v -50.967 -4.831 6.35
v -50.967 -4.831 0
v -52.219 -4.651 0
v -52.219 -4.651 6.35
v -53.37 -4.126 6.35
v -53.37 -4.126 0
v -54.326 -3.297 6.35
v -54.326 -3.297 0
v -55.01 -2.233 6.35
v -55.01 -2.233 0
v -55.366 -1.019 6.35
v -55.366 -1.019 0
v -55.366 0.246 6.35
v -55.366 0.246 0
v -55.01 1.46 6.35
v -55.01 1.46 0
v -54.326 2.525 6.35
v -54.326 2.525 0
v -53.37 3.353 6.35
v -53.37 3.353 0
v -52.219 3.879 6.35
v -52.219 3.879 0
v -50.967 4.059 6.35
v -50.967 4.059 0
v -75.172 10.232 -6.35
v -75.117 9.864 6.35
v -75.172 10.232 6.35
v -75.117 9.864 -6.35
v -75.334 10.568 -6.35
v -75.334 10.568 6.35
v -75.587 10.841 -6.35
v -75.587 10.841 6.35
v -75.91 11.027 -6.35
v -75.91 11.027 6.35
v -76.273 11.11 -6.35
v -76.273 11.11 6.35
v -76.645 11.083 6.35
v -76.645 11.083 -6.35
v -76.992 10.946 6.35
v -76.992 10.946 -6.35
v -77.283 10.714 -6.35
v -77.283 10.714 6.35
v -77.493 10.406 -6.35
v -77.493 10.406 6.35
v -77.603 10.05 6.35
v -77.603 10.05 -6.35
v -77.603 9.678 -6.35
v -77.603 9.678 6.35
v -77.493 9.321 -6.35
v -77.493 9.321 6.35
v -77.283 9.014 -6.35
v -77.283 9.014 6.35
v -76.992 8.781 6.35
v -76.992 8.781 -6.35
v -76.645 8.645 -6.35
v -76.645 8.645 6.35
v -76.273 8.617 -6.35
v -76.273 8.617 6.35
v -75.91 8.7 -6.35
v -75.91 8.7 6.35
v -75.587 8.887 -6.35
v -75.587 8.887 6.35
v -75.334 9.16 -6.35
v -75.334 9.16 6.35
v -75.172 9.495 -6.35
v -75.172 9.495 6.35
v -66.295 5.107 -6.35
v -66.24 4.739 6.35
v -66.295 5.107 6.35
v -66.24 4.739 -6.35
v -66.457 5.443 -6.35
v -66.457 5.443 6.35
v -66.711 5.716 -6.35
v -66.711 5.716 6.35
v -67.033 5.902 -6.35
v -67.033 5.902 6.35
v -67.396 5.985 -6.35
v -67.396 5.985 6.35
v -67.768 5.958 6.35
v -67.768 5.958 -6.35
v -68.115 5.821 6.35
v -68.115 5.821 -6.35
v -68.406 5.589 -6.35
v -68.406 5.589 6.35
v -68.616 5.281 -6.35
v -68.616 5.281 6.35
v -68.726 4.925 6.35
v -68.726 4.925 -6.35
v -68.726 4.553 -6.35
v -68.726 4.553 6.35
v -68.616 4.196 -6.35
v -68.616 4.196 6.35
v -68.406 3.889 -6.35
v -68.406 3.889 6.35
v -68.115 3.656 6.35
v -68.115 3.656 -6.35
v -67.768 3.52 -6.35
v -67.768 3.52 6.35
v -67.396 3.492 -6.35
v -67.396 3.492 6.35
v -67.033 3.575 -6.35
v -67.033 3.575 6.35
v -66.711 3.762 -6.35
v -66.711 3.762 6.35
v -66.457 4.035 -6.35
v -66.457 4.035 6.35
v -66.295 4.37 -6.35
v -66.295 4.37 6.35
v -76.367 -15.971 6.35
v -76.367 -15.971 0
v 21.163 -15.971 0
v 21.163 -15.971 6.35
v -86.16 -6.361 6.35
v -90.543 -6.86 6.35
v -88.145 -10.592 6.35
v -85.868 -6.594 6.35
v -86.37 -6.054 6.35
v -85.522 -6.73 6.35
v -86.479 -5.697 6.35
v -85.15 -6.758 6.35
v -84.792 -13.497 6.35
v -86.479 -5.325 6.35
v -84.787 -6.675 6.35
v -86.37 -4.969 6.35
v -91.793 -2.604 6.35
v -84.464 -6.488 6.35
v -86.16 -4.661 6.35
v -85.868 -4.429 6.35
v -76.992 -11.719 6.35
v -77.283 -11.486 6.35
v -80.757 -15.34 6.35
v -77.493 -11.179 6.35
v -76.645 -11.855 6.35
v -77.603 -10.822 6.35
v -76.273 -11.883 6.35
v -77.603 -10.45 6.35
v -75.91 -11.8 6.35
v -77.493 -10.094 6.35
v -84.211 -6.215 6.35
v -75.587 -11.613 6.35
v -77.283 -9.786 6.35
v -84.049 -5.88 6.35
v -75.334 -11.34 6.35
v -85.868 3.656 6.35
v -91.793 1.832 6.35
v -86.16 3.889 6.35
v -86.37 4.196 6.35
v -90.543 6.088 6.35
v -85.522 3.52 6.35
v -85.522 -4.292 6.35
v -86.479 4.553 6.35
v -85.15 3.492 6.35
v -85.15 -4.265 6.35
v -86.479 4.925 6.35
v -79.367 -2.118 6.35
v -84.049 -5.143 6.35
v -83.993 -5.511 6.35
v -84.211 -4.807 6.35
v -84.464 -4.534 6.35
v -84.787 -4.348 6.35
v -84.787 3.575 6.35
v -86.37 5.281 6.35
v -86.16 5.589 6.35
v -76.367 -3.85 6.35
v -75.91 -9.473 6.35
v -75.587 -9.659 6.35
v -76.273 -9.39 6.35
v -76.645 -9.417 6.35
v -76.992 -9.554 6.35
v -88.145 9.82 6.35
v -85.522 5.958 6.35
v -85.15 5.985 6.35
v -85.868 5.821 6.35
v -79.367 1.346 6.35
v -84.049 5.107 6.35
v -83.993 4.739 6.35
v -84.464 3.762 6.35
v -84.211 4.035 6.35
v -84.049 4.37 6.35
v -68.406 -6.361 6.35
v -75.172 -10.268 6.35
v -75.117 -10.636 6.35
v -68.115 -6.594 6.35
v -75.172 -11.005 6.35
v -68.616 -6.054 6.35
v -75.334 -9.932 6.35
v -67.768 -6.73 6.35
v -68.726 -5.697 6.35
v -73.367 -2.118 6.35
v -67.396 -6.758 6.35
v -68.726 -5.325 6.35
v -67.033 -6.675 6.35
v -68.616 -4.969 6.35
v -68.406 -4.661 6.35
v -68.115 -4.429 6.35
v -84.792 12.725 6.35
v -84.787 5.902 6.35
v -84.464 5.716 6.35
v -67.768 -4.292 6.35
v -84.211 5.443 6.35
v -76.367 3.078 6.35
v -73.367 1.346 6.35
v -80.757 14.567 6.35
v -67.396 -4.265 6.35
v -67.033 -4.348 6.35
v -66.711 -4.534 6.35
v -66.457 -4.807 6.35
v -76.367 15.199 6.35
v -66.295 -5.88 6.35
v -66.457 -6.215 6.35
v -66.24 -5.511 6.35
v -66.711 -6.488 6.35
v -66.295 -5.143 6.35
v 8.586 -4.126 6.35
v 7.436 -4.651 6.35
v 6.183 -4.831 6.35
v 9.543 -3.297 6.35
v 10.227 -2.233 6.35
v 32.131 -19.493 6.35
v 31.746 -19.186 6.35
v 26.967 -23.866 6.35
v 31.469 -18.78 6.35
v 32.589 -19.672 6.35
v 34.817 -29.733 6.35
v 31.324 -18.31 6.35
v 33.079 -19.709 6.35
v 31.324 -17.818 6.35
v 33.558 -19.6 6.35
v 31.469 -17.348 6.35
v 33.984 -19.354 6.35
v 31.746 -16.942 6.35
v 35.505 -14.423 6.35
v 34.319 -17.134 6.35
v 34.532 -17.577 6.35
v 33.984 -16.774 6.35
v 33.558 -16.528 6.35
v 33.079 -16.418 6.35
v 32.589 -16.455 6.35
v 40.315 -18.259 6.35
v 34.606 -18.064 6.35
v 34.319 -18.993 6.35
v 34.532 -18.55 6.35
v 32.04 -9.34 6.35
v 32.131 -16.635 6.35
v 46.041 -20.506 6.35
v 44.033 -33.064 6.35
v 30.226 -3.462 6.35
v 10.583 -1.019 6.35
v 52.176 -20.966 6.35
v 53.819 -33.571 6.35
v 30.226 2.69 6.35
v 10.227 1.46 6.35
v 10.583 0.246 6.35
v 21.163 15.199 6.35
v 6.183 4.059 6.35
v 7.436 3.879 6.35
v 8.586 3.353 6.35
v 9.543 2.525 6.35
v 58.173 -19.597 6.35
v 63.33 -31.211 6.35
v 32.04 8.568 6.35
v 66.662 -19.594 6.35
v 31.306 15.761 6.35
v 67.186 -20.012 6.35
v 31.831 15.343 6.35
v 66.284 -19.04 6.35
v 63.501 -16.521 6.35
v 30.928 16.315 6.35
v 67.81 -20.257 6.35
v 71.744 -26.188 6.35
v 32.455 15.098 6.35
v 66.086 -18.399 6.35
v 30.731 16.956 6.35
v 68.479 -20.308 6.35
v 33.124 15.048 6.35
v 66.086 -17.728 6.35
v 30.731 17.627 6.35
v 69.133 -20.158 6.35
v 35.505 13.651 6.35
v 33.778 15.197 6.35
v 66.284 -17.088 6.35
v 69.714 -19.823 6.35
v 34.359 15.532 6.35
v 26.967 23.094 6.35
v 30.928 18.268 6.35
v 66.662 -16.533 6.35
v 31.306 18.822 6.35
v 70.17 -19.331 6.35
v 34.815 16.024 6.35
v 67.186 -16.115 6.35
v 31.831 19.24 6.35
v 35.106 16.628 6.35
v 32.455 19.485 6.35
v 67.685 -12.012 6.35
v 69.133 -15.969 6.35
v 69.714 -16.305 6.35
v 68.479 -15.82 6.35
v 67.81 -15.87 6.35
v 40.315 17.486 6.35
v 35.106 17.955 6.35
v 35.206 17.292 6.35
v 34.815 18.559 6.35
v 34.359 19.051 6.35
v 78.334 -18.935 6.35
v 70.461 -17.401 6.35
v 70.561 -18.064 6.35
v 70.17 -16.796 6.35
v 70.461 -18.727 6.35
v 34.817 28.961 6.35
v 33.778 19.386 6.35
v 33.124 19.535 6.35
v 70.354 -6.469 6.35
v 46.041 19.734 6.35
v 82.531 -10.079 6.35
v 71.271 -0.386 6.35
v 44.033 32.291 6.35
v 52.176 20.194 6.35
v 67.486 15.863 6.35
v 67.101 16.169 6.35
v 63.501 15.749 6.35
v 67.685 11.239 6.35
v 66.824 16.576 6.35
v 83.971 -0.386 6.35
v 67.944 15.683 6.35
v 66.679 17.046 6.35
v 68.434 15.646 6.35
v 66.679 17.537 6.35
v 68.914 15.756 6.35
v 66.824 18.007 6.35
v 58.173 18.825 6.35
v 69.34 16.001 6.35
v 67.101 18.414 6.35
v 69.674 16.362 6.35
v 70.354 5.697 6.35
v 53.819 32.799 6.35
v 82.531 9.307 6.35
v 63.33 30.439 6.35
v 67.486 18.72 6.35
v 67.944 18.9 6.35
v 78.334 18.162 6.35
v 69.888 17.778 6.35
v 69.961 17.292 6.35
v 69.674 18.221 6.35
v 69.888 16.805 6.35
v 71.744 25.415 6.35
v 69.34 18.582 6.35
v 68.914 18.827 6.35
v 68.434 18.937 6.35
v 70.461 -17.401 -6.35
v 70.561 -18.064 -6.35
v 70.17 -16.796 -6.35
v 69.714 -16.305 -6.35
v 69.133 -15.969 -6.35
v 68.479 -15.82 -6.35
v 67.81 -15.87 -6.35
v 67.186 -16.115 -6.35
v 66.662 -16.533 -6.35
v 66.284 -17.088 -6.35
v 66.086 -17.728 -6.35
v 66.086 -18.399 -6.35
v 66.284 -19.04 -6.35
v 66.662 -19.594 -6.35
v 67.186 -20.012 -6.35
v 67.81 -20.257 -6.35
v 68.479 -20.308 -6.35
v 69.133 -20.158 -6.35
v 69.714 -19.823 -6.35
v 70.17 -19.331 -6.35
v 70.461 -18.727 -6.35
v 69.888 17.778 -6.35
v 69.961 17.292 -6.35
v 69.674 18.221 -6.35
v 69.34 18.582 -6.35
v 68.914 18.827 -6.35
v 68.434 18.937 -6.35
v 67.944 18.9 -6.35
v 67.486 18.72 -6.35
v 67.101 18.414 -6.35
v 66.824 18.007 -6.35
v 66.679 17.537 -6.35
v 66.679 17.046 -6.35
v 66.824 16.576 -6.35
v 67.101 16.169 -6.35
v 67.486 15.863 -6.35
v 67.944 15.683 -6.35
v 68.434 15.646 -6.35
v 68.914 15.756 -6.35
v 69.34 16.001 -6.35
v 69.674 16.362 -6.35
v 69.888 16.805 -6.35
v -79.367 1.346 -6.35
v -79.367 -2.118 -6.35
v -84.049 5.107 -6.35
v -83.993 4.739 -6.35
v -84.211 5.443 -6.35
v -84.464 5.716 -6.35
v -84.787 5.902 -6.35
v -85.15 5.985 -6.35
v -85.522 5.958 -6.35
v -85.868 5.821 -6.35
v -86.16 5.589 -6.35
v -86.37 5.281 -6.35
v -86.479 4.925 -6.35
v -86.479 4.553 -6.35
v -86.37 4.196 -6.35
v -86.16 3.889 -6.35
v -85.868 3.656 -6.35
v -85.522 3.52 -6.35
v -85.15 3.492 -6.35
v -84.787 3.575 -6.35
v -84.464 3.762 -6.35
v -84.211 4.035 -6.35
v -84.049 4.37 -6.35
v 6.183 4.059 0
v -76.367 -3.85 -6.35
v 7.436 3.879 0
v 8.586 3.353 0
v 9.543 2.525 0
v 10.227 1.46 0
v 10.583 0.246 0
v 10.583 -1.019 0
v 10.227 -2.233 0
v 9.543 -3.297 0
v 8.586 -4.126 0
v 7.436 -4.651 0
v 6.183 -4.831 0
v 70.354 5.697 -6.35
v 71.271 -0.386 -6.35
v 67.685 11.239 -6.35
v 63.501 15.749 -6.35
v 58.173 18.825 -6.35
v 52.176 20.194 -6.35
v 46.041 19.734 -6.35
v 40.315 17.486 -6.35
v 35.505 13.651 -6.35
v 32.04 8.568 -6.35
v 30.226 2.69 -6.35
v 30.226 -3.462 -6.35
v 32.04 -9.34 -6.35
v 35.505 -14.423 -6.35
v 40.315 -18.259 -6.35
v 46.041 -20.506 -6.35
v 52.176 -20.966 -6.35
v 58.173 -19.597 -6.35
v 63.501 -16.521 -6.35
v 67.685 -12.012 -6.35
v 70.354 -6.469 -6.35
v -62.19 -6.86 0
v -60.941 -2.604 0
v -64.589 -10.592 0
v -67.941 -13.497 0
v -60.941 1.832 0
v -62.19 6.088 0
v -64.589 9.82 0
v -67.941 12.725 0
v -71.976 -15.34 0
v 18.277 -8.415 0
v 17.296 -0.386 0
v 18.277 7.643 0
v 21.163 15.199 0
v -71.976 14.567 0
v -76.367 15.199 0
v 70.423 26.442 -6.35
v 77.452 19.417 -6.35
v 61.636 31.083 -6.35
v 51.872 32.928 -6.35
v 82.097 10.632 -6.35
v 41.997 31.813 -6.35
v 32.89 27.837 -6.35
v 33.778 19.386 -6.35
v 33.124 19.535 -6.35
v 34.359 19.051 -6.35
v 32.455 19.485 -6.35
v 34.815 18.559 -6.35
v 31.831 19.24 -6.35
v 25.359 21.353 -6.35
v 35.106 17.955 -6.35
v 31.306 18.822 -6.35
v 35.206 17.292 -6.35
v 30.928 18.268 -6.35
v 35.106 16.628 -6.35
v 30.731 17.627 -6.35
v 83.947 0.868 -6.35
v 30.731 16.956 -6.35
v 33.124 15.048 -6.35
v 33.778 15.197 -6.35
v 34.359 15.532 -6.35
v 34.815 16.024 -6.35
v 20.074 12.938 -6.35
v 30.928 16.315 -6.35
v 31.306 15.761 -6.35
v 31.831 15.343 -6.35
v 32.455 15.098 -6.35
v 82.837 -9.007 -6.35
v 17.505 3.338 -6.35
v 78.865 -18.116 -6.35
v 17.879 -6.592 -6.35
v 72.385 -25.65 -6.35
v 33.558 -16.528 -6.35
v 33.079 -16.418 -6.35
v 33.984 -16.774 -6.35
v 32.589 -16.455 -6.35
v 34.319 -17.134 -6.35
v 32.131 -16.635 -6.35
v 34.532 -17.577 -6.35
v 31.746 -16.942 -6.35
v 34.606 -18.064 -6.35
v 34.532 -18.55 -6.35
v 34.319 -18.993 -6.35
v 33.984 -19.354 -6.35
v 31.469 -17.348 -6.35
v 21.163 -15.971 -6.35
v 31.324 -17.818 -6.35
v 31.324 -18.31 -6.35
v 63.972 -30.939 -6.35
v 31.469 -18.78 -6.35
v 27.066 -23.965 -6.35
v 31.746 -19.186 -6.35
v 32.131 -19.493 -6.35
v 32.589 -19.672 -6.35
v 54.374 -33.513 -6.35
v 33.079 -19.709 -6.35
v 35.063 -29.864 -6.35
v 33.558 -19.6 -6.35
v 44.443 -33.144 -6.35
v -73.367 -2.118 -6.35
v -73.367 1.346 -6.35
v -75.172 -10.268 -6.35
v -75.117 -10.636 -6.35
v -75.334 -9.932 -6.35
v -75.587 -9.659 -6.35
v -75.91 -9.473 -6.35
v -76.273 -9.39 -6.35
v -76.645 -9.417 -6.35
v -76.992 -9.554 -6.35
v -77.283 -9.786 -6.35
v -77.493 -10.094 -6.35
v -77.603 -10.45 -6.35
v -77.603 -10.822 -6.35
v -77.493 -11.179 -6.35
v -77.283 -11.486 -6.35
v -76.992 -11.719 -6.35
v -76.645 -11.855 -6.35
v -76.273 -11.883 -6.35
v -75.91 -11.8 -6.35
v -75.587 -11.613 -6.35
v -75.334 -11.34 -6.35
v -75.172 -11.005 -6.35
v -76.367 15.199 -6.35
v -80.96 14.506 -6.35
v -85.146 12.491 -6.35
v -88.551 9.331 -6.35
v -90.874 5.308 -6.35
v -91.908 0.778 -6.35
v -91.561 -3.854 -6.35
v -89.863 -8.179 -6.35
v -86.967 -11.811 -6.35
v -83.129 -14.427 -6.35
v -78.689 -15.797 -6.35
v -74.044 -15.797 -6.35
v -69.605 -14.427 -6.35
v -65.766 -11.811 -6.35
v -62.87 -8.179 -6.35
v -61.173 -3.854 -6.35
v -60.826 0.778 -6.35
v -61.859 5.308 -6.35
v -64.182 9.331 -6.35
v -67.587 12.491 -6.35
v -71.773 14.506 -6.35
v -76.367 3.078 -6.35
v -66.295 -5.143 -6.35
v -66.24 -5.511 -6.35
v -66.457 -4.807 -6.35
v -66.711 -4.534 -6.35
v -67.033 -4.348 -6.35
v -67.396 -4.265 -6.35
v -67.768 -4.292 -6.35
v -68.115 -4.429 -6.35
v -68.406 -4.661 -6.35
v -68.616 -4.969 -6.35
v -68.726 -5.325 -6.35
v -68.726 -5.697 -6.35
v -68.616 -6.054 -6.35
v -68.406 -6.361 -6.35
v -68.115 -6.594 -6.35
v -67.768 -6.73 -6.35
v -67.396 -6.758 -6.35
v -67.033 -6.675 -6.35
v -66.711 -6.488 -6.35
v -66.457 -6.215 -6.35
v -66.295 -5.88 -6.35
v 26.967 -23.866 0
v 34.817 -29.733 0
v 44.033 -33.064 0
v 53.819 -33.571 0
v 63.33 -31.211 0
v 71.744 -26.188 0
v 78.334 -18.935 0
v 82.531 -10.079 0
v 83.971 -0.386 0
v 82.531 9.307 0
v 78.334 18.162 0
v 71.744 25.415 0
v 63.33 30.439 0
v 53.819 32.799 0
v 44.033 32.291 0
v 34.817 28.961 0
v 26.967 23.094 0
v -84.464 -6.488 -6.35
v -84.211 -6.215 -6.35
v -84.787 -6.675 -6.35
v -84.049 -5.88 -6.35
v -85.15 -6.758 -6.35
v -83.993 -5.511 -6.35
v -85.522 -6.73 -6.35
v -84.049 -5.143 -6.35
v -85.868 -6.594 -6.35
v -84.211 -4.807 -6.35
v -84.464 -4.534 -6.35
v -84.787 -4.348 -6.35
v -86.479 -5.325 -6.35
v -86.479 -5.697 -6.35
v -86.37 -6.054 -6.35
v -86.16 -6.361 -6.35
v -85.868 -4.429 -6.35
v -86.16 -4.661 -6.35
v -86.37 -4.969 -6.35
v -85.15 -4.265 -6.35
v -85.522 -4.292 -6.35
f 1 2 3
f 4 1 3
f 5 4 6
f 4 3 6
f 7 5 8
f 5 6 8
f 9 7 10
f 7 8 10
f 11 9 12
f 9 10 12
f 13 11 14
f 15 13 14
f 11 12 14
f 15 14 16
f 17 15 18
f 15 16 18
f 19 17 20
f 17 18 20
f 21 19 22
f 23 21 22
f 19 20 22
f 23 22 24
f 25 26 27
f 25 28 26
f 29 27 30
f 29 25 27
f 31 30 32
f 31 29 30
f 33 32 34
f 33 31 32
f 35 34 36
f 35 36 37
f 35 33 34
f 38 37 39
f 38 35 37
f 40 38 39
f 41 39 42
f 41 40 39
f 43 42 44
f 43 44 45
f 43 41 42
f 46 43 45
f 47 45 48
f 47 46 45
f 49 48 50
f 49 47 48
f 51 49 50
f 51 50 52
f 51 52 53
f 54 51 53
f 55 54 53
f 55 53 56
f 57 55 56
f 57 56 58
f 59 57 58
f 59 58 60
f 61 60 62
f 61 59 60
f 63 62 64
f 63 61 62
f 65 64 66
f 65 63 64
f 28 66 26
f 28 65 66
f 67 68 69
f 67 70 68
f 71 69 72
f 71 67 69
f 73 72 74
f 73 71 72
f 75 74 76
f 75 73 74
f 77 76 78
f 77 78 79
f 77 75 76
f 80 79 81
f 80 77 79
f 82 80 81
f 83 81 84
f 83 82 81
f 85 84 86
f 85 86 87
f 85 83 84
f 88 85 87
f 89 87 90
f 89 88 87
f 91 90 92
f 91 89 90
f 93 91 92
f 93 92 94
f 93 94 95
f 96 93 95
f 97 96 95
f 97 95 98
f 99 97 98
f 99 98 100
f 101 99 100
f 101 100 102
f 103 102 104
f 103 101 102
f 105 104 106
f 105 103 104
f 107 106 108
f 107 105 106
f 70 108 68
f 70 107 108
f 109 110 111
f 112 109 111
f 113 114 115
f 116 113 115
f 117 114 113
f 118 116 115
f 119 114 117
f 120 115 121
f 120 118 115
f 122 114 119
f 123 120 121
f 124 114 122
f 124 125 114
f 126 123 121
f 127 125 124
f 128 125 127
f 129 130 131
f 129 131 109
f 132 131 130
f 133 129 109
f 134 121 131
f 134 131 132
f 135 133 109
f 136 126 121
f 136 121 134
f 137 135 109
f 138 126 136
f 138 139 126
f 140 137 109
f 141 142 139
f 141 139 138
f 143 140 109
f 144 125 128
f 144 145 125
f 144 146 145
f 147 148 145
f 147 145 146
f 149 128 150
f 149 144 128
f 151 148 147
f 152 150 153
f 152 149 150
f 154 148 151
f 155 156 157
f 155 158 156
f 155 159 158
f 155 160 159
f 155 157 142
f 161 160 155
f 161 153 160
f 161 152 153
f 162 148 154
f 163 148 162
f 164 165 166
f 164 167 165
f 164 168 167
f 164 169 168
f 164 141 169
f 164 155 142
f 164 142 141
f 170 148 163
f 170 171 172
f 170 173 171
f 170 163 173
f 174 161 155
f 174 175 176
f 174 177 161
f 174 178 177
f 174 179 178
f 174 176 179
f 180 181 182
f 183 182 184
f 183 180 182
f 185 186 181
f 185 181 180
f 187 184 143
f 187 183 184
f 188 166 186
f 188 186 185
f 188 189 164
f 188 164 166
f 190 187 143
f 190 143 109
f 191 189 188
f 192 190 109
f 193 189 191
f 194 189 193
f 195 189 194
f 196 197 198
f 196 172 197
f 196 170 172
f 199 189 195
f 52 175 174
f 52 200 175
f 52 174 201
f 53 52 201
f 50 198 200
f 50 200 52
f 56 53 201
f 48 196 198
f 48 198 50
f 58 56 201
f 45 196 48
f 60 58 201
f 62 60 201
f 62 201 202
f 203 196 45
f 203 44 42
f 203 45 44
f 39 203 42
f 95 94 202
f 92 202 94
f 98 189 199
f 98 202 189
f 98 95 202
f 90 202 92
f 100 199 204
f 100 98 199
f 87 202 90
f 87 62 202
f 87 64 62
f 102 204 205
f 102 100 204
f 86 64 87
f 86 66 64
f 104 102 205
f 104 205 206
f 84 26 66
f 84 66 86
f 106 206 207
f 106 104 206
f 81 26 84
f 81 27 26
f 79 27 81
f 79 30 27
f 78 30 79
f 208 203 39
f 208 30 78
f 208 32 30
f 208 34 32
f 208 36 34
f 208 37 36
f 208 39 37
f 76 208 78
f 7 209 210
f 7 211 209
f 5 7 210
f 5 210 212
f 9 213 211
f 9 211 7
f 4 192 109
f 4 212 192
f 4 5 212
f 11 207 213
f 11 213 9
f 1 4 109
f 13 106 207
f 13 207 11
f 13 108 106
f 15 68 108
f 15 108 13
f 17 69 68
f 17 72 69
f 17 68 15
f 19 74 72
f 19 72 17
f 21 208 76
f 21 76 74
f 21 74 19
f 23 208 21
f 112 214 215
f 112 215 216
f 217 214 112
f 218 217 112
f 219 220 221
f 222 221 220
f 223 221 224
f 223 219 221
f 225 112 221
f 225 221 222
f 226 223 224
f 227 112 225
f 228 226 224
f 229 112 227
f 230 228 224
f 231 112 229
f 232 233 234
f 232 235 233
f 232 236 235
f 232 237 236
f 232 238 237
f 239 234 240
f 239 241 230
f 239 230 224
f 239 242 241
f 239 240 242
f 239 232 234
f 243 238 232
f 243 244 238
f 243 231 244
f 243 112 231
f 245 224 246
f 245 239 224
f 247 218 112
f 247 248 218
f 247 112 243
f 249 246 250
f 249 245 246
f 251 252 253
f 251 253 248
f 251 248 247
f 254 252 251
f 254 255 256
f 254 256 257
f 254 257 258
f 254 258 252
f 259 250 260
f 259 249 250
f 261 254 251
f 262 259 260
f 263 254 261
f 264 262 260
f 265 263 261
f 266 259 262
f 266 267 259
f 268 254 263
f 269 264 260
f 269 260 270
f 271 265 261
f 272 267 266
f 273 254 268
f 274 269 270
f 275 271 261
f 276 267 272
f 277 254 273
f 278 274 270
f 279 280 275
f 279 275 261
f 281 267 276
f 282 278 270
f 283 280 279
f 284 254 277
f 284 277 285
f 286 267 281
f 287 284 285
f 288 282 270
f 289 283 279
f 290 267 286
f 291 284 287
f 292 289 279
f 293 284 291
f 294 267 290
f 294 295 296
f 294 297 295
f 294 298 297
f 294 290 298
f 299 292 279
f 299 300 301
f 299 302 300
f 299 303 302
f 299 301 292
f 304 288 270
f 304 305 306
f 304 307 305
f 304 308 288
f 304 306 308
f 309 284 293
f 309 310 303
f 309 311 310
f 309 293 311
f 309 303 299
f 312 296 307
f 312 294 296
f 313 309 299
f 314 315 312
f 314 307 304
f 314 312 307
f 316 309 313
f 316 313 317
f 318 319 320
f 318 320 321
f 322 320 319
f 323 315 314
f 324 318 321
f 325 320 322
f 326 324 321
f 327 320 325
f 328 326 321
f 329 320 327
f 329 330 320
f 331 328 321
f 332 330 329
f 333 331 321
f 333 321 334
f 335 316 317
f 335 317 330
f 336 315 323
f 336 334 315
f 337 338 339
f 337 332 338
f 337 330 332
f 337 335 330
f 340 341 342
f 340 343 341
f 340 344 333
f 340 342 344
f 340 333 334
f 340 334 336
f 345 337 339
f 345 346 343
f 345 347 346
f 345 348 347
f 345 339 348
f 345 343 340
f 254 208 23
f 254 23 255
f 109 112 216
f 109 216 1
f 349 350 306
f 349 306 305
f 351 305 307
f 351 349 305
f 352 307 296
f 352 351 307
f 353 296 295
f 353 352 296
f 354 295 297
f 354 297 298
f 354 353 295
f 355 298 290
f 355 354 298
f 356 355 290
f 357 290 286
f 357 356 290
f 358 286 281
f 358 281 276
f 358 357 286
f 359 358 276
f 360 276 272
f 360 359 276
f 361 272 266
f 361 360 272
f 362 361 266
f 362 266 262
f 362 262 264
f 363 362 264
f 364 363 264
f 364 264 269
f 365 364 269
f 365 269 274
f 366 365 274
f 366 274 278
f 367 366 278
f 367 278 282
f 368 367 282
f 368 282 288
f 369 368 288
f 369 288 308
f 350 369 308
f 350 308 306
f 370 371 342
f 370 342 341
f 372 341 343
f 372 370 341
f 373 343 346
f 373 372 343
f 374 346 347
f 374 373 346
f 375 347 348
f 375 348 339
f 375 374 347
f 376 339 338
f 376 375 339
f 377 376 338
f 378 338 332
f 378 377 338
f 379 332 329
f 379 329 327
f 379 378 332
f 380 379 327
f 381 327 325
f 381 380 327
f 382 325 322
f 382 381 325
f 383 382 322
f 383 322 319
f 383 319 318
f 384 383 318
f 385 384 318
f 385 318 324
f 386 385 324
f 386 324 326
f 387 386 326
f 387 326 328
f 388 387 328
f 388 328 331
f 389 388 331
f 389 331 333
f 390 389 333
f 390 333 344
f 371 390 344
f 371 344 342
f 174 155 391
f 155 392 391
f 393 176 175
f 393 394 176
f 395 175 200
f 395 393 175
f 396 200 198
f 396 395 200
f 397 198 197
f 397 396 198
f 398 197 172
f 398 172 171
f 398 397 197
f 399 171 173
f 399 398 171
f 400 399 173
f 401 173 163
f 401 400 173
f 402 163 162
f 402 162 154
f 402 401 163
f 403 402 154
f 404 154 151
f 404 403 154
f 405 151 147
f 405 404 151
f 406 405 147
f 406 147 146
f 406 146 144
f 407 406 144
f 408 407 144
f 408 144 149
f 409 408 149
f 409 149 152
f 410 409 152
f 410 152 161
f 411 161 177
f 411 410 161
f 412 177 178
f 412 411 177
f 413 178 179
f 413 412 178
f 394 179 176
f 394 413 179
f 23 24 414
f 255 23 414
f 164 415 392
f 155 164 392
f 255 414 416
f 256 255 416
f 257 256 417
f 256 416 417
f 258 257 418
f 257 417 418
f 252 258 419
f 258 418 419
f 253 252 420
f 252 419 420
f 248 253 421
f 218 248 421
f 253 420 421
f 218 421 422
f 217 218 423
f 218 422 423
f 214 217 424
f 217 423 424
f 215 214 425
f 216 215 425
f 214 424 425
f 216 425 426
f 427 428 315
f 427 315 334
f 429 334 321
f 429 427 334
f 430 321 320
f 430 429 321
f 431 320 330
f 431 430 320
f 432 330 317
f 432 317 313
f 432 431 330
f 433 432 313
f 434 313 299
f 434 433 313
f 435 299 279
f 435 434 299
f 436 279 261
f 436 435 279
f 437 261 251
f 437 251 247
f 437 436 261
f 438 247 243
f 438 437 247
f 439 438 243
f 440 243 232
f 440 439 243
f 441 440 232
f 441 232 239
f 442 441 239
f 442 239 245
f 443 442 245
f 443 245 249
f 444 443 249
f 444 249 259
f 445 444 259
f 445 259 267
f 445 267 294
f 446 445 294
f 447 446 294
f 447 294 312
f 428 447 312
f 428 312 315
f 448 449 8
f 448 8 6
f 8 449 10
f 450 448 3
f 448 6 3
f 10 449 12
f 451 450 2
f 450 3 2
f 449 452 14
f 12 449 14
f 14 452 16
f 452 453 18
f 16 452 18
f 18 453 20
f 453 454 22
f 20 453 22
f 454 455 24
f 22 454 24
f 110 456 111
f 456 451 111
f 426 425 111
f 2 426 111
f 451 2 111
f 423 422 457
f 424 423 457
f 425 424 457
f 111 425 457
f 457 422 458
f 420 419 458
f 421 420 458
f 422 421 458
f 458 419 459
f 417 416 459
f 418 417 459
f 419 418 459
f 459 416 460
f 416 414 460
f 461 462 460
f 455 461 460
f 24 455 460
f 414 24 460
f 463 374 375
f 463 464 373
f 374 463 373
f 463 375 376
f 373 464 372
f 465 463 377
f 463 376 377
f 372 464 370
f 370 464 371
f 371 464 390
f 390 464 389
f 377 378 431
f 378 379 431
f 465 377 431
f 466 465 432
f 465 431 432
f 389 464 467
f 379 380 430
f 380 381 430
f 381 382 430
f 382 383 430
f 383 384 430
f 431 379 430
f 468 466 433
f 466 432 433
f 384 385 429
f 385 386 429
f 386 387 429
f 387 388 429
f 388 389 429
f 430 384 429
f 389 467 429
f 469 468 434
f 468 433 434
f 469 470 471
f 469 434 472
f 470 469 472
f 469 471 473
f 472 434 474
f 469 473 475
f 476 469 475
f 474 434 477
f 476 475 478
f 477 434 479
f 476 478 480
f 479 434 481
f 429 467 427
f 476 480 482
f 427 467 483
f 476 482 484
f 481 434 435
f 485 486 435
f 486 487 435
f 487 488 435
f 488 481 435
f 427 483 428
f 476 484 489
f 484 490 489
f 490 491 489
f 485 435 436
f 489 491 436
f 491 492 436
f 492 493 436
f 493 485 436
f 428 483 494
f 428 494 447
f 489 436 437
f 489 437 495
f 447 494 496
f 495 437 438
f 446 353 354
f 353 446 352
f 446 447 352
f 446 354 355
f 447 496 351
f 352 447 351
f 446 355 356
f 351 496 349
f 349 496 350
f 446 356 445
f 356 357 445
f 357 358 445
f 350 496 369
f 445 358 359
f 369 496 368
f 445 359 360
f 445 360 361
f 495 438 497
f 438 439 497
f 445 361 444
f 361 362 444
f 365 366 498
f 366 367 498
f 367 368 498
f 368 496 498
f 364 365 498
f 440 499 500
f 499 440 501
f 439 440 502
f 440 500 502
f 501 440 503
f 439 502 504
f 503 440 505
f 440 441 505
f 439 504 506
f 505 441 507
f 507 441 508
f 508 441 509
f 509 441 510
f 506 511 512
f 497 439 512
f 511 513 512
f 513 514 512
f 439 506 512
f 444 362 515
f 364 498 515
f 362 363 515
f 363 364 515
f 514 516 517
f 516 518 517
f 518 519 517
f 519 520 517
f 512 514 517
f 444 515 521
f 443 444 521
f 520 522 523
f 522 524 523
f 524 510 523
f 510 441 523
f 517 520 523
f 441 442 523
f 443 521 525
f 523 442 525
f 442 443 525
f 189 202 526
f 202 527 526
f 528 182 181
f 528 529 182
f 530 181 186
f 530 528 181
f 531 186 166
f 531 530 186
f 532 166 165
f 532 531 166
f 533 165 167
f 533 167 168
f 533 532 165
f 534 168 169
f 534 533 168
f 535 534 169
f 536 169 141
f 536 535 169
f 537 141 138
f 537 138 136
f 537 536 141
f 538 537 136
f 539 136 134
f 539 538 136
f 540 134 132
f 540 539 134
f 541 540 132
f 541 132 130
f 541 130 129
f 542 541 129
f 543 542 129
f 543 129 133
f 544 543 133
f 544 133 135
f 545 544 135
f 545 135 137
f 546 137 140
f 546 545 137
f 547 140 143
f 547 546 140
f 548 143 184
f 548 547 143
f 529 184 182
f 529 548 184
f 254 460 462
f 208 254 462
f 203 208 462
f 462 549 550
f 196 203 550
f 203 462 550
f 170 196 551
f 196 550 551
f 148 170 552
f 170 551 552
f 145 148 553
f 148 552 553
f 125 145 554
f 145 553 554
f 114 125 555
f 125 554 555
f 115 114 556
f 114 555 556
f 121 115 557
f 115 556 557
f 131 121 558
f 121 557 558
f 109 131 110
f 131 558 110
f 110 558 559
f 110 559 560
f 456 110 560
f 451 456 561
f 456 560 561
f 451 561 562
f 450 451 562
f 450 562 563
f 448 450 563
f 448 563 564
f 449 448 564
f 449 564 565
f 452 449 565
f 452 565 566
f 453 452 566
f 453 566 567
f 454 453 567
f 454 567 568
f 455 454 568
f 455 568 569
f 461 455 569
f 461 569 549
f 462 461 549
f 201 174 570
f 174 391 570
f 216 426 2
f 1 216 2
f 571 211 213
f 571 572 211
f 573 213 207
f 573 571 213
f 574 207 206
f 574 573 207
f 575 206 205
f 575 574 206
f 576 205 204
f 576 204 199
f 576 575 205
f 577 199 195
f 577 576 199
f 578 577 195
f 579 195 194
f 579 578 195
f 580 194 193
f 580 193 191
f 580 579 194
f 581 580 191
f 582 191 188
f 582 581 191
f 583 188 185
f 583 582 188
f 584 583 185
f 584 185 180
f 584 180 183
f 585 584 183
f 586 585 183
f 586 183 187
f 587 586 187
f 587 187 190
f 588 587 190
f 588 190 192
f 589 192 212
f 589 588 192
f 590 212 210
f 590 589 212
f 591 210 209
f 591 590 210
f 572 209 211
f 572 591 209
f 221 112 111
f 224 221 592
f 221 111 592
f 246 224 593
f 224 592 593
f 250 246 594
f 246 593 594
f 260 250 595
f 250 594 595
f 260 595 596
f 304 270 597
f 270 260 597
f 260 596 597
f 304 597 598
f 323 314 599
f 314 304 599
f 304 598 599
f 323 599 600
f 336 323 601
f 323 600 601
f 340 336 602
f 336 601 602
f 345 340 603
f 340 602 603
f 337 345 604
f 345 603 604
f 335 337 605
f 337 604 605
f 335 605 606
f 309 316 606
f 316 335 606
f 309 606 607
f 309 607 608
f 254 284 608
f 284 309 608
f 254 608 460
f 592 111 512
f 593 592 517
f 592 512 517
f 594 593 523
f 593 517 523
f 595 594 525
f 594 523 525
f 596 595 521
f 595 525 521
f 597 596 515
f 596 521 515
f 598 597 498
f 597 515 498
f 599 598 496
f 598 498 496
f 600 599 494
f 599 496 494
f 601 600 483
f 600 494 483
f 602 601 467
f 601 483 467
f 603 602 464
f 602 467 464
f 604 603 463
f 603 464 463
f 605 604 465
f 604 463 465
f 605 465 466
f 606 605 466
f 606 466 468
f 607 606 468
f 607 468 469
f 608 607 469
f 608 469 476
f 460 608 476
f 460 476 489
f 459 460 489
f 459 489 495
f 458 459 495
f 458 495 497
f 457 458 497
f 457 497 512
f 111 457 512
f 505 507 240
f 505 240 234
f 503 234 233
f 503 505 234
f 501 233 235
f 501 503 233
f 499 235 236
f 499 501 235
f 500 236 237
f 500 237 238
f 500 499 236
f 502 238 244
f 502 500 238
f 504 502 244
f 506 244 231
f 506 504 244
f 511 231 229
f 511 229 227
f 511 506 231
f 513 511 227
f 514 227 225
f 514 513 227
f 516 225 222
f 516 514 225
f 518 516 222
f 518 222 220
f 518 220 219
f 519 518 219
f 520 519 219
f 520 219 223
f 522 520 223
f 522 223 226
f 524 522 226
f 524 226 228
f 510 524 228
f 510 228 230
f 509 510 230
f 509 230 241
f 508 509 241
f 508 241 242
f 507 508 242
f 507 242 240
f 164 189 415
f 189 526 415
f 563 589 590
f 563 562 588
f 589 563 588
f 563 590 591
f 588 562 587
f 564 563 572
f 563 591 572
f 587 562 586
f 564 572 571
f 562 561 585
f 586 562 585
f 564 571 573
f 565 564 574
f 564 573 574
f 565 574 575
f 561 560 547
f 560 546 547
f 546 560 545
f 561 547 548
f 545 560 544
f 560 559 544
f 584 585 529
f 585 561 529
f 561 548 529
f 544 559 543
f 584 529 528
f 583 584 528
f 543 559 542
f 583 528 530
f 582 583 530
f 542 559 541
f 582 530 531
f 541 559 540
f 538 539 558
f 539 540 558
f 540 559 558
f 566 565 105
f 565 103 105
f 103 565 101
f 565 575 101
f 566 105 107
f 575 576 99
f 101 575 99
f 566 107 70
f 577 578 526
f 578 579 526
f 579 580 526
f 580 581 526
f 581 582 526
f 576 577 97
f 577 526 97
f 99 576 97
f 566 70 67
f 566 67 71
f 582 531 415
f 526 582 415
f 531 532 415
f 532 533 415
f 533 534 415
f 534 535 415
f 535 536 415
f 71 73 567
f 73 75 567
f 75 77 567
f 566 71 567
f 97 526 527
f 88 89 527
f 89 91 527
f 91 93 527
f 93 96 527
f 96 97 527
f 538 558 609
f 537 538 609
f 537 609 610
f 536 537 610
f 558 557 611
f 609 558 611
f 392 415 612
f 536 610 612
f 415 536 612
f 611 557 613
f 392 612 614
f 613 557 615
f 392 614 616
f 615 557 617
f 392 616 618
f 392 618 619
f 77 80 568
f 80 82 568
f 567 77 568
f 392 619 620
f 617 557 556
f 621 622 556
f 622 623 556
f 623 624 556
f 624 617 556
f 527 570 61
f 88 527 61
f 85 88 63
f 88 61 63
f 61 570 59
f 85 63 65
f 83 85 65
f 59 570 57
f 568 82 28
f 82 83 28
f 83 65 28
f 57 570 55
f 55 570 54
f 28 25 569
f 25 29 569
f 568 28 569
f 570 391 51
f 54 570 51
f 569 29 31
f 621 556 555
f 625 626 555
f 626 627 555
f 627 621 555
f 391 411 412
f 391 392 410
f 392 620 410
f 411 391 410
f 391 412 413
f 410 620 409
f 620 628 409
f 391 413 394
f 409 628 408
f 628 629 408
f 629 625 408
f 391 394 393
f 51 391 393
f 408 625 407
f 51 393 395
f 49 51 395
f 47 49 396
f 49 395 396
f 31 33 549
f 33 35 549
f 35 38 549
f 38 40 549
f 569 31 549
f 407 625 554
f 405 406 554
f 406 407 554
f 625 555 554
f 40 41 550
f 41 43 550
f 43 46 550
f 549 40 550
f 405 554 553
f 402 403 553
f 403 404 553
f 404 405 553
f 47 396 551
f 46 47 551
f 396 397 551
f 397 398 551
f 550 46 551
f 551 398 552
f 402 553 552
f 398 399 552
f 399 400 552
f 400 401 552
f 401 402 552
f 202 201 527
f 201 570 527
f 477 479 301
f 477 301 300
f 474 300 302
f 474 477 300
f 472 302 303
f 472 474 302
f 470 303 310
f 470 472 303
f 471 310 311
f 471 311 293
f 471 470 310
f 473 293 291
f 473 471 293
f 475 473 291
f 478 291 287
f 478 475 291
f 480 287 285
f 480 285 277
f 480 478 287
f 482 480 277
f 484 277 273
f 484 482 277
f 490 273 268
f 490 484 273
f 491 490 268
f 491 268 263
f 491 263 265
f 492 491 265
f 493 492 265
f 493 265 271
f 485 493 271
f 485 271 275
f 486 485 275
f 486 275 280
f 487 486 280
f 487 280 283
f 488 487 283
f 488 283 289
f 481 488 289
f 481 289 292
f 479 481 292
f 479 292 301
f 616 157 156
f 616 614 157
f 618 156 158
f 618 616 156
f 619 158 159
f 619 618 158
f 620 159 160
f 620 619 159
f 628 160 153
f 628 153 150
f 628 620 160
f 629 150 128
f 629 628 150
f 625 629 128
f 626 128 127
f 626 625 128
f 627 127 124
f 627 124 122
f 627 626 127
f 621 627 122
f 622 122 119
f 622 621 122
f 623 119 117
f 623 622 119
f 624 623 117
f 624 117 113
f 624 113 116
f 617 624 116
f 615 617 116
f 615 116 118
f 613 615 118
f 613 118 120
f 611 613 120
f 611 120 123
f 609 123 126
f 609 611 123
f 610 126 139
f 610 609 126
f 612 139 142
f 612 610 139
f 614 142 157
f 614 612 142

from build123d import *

# Parameters (mm, degrees)
SKETCH1_R           = 1.65
SKETCH1_R_2         = 2.25
SKETCH1_R_3         = 20.6375
SKETCH1_R_4         = 1.25
BOSS_EXTRUDE1_DEPTH = 6.35
BOSS_EXTRUDE2_START = -6.35
SKETCH1_3_R         = 15.584715873
SKETCH1_3_R_2       = 1.25
SKETCH1_3_R_3       = 33.3375
SKETCH1_3_R_4       = 1.65
SKETCH1_3_R_5       = 2.25
SKETCH1_3_R_6       = 20.6375
BOSS_EXTRUDE2_DEPTH = 6.35


with BuildPart() as part:
    # Sketch1 → Boss-Extrude1 (new body)
    with BuildSketch(Plane.XY):
        with BuildLine():
            Line((21.162931467, 15.198561829), (-76.366650528, 15.198561829))
            ThreePointArc((-76.366650528, 15.198561829), (-91.951366401, -0.386154045), (-76.366650528, -15.970869918))
            Line((-76.366650528, -15.970869918), (21.162931467, -15.970869918))
            ThreePointArc((21.162931467, -15.970869918), (83.970849472, -0.386154045), (21.162931467, 15.198561829))
        make_face()
        with BuildLine():
            ThreePointArc((-50.966650528, -4.831154045), (-55.411650528, -0.386154045), (-50.966650528, 4.058845955))
            Line((-50.966650528, 4.058845955), (6.183349472, 4.058845955))
            ThreePointArc((6.183349472, 4.058845955), (10.628349472, -0.386154045), (6.183349472, -4.831154045))
            Line((6.183349472, -4.831154045), (-50.966650528, -4.831154045))
        make_face(mode=Mode.SUBTRACT)
        with Locations((68.311019002, 17.291515485)):
            Circle(SKETCH1_R, mode=Mode.SUBTRACT)
        with Locations((32.955679943, -18.063823575)):
            Circle(SKETCH1_R, mode=Mode.SUBTRACT)
        with Locations((68.311019002, -18.063823575)):
            Circle(SKETCH1_R_2, mode=Mode.SUBTRACT)
        with Locations((50.633349472, -0.386154045)):
            Circle(SKETCH1_R_3, mode=Mode.SUBTRACT)
        with Locations((32.955679943, 17.291515485)):
            Circle(SKETCH1_R_2, mode=Mode.SUBTRACT)
        with Locations((-67.489890139, 4.738845955)):
            Circle(SKETCH1_R_4, mode=Mode.SUBTRACT)
        with Locations((-76.366650528, 9.863845955)):
            Circle(SKETCH1_R_4, mode=Mode.SUBTRACT)
        with Locations((-76.366650528, -10.636154045)):
            Circle(SKETCH1_R_4, mode=Mode.SUBTRACT)
        with Locations((-85.243410916, -5.511154045)):
            Circle(SKETCH1_R_4, mode=Mode.SUBTRACT)
        Polygon((-79.366650528, 1.345896763), (-76.366650528, 3.07794757), (-73.366650528, 1.345896763), (-73.366650528, -2.118204852), (-76.366650528, -3.85025566), (-79.366650528, -2.118204852), align=None, mode=Mode.SUBTRACT)
        with Locations((-67.489890139, -5.511154045)):
            Circle(SKETCH1_R_4, mode=Mode.SUBTRACT)
        with Locations((-85.243410916, 4.738845955)):
            Circle(SKETCH1_R_4, mode=Mode.SUBTRACT)
    extrude(amount=BOSS_EXTRUDE1_DEPTH)

    # Sketch1<3> → Boss-Extrude2 (add)
    # profile 1 of 2: a face of its own
    with BuildSketch(Plane.XY.offset(BOSS_EXTRUDE2_START)):
        with Locations((-76.366650528, -0.386154045)):
            Circle(SKETCH1_3_R)
        with Locations((-76.366650528, -10.636154045)):
            Circle(SKETCH1_3_R_2, mode=Mode.SUBTRACT)
        with Locations((-85.243410916, -5.511154045)):
            Circle(SKETCH1_3_R_2, mode=Mode.SUBTRACT)
        Polygon((-79.366650528, 1.345896763), (-76.366650528, 3.07794757), (-73.366650528, 1.345896763), (-73.366650528, -2.118204852), (-76.366650528, -3.85025566), (-79.366650528, -2.118204852), align=None, mode=Mode.SUBTRACT)
        with Locations((-67.489890139, -5.511154045)):
            Circle(SKETCH1_3_R_2, mode=Mode.SUBTRACT)
        with Locations((-85.243410916, 4.738845955)):
            Circle(SKETCH1_3_R_2, mode=Mode.SUBTRACT)
        with Locations((-67.489890139, 4.738845955)):
            Circle(SKETCH1_3_R_2, mode=Mode.SUBTRACT)
        with Locations((-76.366650528, 9.863845955)):
            Circle(SKETCH1_3_R_2, mode=Mode.SUBTRACT)
    # profile 2 of 2: a face of its own
    with BuildSketch(Plane.XY.offset(BOSS_EXTRUDE2_START)):
        with Locations((50.633349472, -0.386154045)):
            Circle(SKETCH1_3_R_3)
        with Locations((32.955679943, -18.063823575)):
            Circle(SKETCH1_3_R_4, mode=Mode.SUBTRACT)
        with Locations((68.311019002, -18.063823575)):
            Circle(SKETCH1_3_R_5, mode=Mode.SUBTRACT)
        with Locations((50.633349472, -0.386154045)):
            Circle(SKETCH1_3_R_6, mode=Mode.SUBTRACT)
        with Locations((32.955679943, 17.291515485)):
            Circle(SKETCH1_3_R_5, mode=Mode.SUBTRACT)
        with Locations((68.311019002, 17.291515485)):
            Circle(SKETCH1_3_R_4, mode=Mode.SUBTRACT)
    extrude(amount=BOSS_EXTRUDE2_DEPTH)


solid = part.part
